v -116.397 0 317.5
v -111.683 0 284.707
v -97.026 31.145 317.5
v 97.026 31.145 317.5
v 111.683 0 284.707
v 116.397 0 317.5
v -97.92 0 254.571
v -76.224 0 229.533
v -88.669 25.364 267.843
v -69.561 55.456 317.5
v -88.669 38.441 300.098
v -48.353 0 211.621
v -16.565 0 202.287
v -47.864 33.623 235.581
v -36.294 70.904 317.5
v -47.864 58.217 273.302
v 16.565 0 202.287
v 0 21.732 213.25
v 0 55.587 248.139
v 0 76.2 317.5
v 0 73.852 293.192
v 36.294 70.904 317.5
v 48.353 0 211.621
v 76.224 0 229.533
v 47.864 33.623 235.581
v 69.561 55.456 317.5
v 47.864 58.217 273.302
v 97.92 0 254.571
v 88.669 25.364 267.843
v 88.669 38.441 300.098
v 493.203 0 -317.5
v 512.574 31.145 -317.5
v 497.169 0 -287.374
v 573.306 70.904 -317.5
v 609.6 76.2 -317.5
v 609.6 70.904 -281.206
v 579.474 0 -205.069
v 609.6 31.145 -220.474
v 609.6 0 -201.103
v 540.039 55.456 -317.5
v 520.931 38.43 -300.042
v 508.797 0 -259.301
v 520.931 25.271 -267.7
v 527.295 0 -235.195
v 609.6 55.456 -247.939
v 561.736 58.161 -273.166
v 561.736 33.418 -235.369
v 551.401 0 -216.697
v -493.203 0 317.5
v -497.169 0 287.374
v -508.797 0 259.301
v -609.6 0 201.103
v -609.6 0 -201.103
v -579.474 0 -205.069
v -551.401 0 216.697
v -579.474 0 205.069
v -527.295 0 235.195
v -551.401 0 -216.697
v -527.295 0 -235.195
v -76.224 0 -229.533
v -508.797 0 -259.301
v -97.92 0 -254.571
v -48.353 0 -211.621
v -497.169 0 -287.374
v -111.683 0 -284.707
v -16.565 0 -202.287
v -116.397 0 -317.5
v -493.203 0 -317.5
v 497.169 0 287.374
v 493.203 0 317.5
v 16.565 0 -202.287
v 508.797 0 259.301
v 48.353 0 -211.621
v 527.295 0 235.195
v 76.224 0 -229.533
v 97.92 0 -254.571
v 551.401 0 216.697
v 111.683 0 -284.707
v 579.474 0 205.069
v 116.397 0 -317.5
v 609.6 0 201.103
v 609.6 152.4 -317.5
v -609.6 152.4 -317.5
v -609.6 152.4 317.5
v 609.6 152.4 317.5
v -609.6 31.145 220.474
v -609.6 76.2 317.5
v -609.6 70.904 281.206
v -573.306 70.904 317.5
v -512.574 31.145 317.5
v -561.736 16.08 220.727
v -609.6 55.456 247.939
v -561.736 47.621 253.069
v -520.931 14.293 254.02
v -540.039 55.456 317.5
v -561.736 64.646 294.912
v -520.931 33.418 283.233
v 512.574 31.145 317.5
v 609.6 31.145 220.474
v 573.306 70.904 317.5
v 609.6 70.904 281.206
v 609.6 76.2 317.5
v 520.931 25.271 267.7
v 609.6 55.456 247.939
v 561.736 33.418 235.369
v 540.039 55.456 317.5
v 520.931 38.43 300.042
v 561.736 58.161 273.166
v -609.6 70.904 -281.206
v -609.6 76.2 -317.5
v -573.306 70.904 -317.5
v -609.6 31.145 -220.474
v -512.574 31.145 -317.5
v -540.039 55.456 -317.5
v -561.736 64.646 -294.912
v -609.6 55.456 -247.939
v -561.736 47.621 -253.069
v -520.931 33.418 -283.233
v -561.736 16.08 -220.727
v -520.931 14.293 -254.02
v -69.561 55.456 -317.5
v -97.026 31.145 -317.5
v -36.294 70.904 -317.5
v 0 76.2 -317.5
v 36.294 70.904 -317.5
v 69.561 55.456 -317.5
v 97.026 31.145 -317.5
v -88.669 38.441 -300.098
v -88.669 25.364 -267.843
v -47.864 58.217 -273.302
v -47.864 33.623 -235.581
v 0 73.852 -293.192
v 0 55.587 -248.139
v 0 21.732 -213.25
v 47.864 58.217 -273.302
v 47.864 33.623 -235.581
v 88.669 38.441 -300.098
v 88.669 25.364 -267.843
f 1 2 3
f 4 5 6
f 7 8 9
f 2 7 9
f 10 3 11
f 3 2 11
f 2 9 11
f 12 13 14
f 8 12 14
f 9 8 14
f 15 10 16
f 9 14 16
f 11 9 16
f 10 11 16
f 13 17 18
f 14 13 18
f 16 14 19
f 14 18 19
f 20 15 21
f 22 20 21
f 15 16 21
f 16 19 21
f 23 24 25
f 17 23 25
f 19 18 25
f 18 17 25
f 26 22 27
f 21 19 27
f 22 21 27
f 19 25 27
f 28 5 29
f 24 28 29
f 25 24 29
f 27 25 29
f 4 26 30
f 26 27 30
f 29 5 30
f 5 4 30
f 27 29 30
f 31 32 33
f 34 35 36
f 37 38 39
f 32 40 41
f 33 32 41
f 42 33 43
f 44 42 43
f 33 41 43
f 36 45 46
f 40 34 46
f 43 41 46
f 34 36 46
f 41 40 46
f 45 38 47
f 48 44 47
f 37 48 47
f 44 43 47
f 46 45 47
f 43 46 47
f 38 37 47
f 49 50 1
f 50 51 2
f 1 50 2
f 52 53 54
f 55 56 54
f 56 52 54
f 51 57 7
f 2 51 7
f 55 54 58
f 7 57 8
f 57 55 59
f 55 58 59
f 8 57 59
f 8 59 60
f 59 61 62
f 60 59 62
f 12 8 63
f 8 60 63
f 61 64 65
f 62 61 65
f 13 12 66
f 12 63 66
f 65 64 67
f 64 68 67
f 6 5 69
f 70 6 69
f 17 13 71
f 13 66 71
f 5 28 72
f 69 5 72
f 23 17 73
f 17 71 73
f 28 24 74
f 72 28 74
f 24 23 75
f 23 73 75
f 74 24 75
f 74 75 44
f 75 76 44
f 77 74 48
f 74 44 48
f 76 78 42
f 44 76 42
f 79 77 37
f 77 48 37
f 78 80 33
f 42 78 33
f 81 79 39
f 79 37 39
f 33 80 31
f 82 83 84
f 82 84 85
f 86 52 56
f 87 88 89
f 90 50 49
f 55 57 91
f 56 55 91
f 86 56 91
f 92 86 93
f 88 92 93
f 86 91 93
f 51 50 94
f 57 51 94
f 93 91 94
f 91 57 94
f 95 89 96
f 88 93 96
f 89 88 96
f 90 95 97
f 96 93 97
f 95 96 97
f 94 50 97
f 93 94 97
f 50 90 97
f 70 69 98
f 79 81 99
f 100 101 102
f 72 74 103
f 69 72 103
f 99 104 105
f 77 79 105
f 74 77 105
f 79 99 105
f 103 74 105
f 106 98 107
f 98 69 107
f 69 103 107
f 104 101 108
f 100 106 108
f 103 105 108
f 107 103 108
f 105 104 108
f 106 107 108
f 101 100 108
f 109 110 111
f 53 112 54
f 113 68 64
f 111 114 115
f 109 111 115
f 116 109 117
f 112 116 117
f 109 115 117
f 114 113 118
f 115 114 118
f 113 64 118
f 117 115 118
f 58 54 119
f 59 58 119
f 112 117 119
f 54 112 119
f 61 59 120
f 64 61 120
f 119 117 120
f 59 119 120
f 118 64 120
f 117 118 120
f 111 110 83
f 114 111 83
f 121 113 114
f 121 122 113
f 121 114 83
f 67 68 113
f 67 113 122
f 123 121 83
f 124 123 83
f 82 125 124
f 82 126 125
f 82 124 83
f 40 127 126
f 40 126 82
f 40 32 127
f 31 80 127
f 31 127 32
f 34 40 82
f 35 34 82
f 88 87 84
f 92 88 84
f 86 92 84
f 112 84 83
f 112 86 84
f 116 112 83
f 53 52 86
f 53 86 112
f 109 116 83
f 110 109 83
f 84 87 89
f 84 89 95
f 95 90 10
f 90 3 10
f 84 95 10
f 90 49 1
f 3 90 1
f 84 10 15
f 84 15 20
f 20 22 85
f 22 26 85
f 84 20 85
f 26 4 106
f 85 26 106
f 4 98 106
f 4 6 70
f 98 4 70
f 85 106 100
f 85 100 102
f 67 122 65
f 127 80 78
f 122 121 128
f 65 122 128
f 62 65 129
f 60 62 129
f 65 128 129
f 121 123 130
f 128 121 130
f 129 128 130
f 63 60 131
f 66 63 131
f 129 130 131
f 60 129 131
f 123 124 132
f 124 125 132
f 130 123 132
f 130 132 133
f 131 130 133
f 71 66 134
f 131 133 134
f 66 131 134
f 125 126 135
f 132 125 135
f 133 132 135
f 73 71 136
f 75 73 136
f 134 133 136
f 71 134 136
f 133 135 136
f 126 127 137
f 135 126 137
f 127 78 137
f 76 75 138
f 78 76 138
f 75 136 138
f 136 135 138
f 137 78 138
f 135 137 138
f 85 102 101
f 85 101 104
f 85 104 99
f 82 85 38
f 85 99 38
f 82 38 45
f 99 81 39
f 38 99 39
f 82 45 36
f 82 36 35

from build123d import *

# Parameters (mm, degrees)
SKETCH1_W           = 1219.2
SKETCH1_H           = 635
BOSS_EXTRUDE1_DEPTH = 152.4
LPATTERN3_COUNT     = 3
LPATTERN3_PITCH     = 609.6
LPATTERN3_2_COUNT   = 2
LPATTERN3_2_PITCH   = 635


with BuildPart() as part:
    # Sketch1 → Boss-Extrude1 (new body)
    with BuildSketch(Plane(origin=(0, 0, 0), x_dir=(1, 0, 0), z_dir=(0, 1, 0))):
        Rectangle(SKETCH1_W, SKETCH1_H)
    extrude(amount=BOSS_EXTRUDE1_DEPTH)


with BuildPart() as body_2:
    # Sketch3 → Revolve1 (revolve)
    with BuildSketch(Plane(origin=(0, -50.8, 0), x_dir=(-1, 0, 0), z_dir=(0, -1, 0))):
        with BuildLine():
            Line((-736.6, 317.5), (-482.6, 317.5))
            ThreePointArc((-482.6, 317.5), (-609.6, 444.5), (-736.6, 317.5))
        make_face()
    revolve(axis=Axis((-609.6, -50.8, -317.5), (1, 0, 0)))


with BuildPart() as lpattern3_1:
    # LPattern3: pattern copy
    add(body_2.part.moved(Location(Vector(-1, 0, 0) * (1 * LPATTERN3_PITCH))))


with BuildPart() as lpattern3_2:
    # LPattern3: pattern copy
    add(body_2.part.moved(Location(Vector(-1, 0, 0) * (2 * LPATTERN3_PITCH))))


with BuildPart() as lpattern3_2_1:
    # LPattern3 2: pattern copy
    add(body_2.part.moved(Location(Vector(0, 0, 1) * (1 * LPATTERN3_2_PITCH))))


with BuildPart() as lpattern3_2_2:
    # LPattern3 2: pattern copy
    add(lpattern3_1.part.moved(Location(Vector(0, 0, 1) * (1 * LPATTERN3_2_PITCH))))


with BuildPart() as lpattern3_2_3:
    # LPattern3 2: pattern copy
    add(lpattern3_2.part.moved(Location(Vector(0, 0, 1) * (1 * LPATTERN3_2_PITCH))))


with BuildPart() as part_1:
    add(part.part)

    # Intersect1: read off the stored shape, not the designer's step
    # Intersect1: cut body 2, LPattern3_1, LPattern3_2, LPattern3 2_1, LPattern3 2_2, LPattern3 2_3
    add(body_2.part, mode=Mode.SUBTRACT)
    add(lpattern3_1.part, mode=Mode.SUBTRACT)
    add(lpattern3_2.part, mode=Mode.SUBTRACT)
    add(lpattern3_2_1.part, mode=Mode.SUBTRACT)
    add(lpattern3_2_2.part, mode=Mode.SUBTRACT)
    add(lpattern3_2_3.part, mode=Mode.SUBTRACT)


solid = part_1.part
